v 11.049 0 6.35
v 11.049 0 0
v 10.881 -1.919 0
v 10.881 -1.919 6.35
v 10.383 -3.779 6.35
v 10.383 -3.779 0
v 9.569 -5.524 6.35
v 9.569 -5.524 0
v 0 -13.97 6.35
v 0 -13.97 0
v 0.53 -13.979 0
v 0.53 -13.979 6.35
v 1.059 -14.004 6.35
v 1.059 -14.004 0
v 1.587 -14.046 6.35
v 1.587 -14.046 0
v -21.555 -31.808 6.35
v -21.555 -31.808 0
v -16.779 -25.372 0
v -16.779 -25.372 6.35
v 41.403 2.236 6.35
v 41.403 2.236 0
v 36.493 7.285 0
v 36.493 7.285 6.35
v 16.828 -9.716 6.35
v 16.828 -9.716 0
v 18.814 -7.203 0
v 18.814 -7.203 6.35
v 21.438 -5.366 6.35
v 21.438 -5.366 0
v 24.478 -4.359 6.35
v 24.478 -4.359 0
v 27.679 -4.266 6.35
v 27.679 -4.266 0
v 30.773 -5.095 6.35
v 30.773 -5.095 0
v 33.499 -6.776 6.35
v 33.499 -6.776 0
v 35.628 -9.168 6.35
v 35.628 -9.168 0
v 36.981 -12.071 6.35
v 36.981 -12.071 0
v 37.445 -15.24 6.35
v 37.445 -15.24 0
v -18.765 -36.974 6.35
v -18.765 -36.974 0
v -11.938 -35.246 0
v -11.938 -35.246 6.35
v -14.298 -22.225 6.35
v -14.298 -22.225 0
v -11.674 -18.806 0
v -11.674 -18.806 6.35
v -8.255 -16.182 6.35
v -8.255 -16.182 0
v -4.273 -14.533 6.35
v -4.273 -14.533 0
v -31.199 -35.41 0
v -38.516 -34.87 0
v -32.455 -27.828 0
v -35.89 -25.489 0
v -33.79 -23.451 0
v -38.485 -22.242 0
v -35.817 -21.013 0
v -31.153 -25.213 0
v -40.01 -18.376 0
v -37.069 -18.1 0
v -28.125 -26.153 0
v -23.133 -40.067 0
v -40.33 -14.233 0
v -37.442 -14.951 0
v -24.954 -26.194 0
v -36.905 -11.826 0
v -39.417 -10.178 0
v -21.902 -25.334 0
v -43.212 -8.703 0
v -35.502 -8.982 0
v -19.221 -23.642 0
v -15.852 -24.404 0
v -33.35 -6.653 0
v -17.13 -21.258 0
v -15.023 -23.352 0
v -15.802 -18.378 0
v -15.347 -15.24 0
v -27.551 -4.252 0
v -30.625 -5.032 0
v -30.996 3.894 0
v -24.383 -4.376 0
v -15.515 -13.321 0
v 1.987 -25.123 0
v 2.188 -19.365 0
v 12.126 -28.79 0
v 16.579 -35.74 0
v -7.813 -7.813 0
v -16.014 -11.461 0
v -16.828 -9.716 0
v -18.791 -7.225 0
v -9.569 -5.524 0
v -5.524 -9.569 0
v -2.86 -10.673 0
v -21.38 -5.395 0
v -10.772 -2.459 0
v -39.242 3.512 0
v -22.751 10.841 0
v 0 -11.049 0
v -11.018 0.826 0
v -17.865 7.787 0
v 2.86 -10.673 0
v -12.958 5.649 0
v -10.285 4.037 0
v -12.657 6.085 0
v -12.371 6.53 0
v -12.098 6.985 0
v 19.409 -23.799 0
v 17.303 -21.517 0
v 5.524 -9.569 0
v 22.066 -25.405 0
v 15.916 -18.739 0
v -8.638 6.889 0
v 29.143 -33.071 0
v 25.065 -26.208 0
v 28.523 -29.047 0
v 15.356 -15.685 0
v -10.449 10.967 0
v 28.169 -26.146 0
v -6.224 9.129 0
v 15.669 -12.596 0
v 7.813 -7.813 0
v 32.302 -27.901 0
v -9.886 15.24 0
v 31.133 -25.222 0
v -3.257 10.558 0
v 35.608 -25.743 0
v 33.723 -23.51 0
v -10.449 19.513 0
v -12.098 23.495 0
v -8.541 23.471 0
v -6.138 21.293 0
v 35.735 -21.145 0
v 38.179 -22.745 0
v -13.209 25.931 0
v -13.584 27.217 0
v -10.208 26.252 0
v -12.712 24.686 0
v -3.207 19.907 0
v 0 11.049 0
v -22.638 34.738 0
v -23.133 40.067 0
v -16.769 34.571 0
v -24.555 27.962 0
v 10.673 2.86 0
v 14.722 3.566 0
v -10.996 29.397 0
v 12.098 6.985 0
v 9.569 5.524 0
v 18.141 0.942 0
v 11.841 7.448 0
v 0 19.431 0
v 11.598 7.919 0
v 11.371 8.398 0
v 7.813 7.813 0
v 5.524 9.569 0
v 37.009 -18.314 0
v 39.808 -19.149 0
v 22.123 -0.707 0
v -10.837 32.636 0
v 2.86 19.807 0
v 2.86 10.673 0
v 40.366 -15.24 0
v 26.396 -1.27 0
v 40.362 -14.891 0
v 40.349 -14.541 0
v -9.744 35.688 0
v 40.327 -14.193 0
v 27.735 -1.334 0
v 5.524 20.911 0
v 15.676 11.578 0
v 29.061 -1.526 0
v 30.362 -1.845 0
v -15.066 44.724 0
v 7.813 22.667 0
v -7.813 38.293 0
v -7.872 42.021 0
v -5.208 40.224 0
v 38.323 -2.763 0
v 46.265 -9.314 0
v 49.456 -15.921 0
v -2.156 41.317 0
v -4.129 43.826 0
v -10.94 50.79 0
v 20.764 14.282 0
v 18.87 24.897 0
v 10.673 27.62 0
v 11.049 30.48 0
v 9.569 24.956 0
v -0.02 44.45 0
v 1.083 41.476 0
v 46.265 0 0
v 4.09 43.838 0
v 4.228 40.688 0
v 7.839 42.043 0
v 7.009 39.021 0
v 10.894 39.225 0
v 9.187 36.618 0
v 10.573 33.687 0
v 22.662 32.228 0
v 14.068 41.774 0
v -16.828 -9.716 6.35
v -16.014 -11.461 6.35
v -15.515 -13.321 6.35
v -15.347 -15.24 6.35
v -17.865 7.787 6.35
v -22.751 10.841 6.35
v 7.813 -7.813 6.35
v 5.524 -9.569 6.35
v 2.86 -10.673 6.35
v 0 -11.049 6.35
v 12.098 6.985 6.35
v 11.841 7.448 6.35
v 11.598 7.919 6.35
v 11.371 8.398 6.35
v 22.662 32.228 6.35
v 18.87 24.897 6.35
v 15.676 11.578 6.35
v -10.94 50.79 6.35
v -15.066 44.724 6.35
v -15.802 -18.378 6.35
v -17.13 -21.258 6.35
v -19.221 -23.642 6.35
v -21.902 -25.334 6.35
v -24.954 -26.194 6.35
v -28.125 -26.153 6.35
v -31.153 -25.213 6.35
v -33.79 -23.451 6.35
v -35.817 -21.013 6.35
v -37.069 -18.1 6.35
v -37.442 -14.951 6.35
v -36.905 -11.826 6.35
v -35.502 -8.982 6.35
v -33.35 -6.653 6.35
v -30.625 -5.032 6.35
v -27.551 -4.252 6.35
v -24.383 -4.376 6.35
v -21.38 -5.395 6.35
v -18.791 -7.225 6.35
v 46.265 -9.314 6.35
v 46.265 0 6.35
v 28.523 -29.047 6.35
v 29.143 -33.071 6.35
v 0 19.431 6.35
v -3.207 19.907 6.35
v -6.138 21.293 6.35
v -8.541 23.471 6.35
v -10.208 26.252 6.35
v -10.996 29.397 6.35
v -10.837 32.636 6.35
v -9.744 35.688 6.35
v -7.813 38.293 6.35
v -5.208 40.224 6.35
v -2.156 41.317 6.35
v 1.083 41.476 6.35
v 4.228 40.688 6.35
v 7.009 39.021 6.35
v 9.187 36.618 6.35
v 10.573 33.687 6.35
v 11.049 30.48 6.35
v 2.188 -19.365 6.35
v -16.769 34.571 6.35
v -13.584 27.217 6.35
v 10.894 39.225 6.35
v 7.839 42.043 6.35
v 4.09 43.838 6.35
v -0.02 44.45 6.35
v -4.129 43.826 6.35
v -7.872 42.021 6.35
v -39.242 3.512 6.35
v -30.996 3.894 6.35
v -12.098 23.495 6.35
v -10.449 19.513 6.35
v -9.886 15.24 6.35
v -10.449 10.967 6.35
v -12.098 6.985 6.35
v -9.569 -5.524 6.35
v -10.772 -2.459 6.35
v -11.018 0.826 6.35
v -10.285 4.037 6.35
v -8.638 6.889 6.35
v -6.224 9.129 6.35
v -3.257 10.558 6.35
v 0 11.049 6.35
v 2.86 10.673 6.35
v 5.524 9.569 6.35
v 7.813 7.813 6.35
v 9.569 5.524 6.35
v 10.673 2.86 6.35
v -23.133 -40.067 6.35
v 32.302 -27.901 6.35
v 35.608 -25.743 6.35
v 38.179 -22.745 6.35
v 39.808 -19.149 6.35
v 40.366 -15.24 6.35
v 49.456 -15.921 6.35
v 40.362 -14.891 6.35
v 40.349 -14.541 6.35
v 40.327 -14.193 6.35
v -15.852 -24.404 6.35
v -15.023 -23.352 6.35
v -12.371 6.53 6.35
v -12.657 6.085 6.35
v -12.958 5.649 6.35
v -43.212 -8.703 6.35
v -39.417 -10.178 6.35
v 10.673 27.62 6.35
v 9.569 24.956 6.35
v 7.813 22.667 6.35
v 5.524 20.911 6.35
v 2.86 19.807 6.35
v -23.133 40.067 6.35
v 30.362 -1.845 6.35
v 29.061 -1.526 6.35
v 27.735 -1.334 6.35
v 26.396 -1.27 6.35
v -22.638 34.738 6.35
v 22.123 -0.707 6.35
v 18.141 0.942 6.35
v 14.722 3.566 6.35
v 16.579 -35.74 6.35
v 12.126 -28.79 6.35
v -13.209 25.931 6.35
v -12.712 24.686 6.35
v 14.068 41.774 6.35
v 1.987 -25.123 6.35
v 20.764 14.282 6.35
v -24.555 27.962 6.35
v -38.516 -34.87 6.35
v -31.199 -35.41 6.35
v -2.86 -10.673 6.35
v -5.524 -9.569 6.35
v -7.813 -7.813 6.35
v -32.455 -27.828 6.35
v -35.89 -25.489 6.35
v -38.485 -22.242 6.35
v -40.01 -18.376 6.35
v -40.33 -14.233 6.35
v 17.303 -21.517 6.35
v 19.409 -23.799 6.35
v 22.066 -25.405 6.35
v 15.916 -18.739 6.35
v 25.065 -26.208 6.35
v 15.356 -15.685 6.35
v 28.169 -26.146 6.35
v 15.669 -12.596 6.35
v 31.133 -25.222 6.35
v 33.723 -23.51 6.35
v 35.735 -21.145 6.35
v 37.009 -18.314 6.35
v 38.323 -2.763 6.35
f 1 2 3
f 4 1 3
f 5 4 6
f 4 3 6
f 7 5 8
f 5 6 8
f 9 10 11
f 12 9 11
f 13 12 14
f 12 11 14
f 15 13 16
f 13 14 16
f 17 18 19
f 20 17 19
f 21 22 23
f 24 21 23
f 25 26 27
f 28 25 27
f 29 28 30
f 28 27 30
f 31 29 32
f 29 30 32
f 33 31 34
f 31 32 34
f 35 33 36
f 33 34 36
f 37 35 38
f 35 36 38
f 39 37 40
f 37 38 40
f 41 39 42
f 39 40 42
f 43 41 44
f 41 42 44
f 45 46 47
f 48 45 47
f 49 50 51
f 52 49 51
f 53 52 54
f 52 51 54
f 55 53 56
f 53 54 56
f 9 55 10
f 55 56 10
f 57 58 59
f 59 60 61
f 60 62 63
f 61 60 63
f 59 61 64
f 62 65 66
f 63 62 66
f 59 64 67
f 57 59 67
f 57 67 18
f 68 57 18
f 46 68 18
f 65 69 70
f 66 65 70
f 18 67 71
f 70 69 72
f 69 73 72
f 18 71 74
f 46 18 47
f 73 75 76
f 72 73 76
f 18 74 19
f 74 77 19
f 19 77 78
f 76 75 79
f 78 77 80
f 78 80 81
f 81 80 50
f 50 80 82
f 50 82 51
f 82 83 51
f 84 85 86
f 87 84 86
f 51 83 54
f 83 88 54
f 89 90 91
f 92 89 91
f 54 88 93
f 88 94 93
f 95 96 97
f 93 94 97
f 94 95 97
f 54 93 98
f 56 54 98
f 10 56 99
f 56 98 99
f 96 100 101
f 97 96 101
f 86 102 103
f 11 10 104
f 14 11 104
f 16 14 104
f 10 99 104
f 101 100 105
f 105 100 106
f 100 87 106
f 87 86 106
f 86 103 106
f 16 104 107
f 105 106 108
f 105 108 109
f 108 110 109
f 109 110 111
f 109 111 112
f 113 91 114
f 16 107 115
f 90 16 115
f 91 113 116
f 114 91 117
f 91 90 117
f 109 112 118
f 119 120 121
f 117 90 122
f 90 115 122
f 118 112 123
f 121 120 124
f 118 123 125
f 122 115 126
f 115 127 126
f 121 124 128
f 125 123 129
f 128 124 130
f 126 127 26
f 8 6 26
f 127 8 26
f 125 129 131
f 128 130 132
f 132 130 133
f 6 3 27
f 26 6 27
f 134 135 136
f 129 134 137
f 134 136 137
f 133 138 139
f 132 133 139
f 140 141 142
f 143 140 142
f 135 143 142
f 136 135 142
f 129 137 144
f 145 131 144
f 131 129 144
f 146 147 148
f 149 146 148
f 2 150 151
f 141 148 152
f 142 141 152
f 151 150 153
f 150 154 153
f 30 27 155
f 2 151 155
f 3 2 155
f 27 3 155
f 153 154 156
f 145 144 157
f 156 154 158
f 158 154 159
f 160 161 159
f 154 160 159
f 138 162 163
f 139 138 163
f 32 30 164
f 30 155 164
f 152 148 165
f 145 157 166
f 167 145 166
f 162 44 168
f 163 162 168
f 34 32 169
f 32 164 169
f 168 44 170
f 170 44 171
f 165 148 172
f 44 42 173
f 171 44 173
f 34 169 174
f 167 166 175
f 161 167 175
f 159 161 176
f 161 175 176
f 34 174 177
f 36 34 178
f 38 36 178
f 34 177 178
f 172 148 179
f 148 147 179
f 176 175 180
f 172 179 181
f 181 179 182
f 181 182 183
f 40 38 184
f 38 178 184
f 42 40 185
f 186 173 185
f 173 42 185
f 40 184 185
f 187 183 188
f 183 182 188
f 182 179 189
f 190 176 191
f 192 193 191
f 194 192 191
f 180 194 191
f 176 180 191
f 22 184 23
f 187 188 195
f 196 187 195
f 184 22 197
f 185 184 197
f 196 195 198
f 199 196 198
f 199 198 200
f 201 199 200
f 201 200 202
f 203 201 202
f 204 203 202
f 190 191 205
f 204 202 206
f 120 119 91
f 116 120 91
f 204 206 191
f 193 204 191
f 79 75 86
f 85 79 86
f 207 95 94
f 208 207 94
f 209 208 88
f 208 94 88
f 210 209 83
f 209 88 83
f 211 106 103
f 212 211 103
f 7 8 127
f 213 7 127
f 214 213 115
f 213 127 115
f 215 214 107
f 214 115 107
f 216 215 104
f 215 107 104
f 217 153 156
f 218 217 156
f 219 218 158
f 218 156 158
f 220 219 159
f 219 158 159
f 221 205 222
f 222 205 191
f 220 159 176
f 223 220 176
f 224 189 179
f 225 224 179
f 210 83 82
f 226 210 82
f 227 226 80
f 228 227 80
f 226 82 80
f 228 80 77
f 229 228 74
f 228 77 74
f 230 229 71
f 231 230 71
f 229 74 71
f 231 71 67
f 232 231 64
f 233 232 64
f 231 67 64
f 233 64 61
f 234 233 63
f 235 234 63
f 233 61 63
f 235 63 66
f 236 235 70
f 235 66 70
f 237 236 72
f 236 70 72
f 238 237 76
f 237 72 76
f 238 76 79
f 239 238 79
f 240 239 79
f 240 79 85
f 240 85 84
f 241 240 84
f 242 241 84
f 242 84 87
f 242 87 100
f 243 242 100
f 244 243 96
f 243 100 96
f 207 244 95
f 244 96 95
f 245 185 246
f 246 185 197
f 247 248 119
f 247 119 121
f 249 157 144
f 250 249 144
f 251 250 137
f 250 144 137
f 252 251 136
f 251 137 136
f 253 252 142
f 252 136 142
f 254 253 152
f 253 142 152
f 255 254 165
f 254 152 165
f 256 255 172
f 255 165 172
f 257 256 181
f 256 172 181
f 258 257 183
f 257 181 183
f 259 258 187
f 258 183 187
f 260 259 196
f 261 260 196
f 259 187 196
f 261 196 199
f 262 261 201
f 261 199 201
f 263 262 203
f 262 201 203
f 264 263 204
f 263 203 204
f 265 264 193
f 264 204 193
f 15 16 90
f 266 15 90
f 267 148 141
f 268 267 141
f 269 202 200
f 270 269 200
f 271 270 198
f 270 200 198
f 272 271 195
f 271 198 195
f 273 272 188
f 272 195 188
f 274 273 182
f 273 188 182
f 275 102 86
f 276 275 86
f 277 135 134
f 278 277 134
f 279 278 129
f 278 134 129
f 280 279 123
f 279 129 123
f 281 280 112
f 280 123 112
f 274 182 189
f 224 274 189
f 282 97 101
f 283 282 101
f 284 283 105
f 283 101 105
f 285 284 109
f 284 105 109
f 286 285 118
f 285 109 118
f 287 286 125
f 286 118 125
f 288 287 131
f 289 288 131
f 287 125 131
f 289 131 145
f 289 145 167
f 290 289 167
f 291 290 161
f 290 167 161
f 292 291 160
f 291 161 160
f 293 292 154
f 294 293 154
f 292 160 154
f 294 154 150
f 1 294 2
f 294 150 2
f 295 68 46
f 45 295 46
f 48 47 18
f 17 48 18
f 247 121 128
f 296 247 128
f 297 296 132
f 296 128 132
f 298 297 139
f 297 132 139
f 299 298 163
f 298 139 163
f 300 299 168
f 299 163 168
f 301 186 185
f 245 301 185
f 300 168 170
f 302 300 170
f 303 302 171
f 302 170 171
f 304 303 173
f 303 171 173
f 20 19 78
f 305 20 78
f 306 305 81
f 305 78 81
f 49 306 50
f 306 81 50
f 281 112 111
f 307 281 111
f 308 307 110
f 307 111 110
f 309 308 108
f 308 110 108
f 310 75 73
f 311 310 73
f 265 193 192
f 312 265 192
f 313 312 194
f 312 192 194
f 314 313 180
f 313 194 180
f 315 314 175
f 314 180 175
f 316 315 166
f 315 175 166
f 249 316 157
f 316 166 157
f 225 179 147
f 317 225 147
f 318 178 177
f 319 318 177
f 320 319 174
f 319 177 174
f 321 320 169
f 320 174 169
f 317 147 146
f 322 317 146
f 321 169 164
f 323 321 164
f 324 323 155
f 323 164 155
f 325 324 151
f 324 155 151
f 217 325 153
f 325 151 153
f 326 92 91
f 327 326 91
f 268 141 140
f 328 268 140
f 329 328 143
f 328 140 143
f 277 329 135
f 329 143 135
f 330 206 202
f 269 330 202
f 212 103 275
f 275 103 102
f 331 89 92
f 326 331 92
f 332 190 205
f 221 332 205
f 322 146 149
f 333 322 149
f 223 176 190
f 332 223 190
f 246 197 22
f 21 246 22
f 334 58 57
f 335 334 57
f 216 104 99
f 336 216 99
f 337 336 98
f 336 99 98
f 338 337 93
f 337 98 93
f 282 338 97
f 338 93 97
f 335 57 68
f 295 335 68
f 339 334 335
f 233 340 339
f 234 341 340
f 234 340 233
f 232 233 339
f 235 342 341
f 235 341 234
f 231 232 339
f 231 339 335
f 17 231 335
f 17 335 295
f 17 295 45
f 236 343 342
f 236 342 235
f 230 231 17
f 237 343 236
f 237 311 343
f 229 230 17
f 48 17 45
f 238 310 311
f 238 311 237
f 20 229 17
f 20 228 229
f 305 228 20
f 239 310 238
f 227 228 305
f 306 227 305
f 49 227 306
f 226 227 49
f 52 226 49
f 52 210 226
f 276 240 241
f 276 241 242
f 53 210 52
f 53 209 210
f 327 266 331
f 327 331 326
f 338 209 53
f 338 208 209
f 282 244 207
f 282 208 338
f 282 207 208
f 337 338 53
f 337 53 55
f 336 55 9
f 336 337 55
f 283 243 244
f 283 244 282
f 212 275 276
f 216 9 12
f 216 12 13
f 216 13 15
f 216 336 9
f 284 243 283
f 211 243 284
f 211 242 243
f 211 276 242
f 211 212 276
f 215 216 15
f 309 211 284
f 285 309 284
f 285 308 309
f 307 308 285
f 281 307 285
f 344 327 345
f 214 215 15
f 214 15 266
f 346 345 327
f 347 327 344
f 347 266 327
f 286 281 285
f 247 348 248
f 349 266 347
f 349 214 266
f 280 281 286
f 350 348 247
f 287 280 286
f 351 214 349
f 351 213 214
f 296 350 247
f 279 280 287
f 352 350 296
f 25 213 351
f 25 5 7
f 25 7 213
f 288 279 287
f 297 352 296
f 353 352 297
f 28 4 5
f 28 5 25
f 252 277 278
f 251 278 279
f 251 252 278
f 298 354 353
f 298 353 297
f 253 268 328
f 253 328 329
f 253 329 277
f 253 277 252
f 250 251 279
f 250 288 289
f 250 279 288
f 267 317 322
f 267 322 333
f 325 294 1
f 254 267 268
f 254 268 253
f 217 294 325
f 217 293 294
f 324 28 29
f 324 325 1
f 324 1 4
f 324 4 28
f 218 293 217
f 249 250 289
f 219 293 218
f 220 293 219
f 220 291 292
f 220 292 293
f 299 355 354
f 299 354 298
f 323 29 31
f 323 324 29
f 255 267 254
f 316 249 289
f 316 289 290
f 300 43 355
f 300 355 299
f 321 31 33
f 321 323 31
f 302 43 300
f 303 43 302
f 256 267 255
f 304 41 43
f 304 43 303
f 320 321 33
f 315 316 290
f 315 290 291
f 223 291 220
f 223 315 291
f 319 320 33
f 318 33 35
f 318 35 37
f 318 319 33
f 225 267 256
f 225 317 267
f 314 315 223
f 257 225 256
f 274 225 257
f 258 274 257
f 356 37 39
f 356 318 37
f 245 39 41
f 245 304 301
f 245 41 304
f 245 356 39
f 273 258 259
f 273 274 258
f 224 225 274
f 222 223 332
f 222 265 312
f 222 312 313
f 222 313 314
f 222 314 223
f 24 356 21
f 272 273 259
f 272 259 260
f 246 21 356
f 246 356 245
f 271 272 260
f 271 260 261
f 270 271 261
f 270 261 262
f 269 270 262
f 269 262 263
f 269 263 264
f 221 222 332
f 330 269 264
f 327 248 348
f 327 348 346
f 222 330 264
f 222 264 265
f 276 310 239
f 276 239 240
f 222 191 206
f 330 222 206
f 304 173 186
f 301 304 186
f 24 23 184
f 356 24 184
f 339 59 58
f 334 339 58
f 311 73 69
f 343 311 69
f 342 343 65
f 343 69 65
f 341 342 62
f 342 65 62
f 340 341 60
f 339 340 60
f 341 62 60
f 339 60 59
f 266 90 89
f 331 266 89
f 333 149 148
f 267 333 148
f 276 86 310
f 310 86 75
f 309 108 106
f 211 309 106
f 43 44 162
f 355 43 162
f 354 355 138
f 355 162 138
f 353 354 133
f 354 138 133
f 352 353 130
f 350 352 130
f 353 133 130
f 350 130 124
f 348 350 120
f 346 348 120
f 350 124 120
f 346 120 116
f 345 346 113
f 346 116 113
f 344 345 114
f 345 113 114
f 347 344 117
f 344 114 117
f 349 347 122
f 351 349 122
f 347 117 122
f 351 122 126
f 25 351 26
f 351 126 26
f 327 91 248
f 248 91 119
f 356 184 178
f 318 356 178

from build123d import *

# Parameters (mm, degrees)
F1_DEPTH = 6.35


with BuildPart() as f1:
    # F0 (on Top) → F1 (new body)
    with BuildSketch(Plane.XY):
        with BuildLine():
            ThreePointArc((12.0983748909, -6.985), (13.4939837933, -3.6157020601), (13.97, 0))
            ThreePointArc((13.97, 0), (13.4939838226, 3.6157019506), (12.0983750042, 6.9849998037))
            ThreePointArc((12.0983750042, 6.9849998037), (11.6864099278, 7.6543270769), (11.2374555691, 8.2994272292))
            ThreePointArc((11.2374555691, 8.2994272292), (6.2935642369, 12.4720467124), (0, 13.97))
            Line((0, 13.97), (0, 11.049))
            ThreePointArc((0, 11.049), (7.8128228253, 7.8128228253), (11.049, 0))
            ThreePointArc((11.049, 0), (10.6725144547, -2.8596916293), (9.5687146864, -5.5245))
            Line((9.5687146864, -5.5245), (12.0983748909, -6.985))
        make_face()
        with BuildLine():
            ThreePointArc((12.0983750042, 6.9849998037), (13.4939838226, 3.6157019506), (13.97, 0))
            ThreePointArc((13.97, 0), (13.4939837933, -3.6157020601), (12.0983748909, -6.985))
            Line((12.0983748909, -6.985), (14.2980794165, -8.255))
            ThreePointArc((14.2980794165, -8.255), (19.4114543073, -3.1416251091), (26.3964543073, -1.27))
            ThreePointArc((26.3964543073, -1.27), (18.1414544055, 0.9419205269), (12.0983750042, 6.9849998037))
        make_face()
        with BuildLine():
            ThreePointArc((11.2374555691, 8.2994272292), (11.6864099278, 7.6543270769), (12.0983750042, 6.9849998037))
            ThreePointArc((12.0983750042, 6.9849998037), (11.7176305412, 7.6827364184), (11.3709095484, 8.3979897181))
            Line((11.3709095484, 8.3979897181), (11.2374555691, 8.2994272292))
        make_face()
        with BuildLine():
            Line((14.2980794165, -8.255), (12.0983748909, -6.985))
            ThreePointArc((12.0983748909, -6.985), (7.6543271717, -11.6864098657), (1.5687870328, -13.8816356113))
            Line((1.5687870328, -13.8816356113), (1.5874176624, -14.0464913921))
            ThreePointArc((1.5874176624, -14.0464913921), (8.9336025837, -16.5958059335), (14.2980794165, -22.225))
            ThreePointArc((14.2980794165, -22.225), (12.4264543073, -15.24), (14.2980794165, -8.255))
        make_face()
        with BuildLine():
            ThreePointArc((1.5687870328, -13.8816356113), (7.6543271717, -11.6864098657), (12.0983748909, -6.985))
            Line((12.0983748909, -6.985), (9.5687146864, -5.5245))
            ThreePointArc((9.5687146864, -5.5245), (5.5245, -9.5687146864), (0, -11.049))
            Line((0, -11.049), (0, -13.97))
            ThreePointArc((8e-10, -13.97), (0.7856368471, -13.9478914085), (1.5687870328, -13.8816356113))
        make_face()
        with BuildLine():
            ThreePointArc((0, 13.97), (6.2935642369, 12.4720467124), (11.2374555691, 8.2994272292))
            Line((11.2374555691, 8.2994272292), (11.3709095484, 8.3979897181))
            ThreePointArc((11.3709095484, 8.3979897181), (9.9055882428, 16.0346297515), (12.0983748909, 23.495))
            ThreePointArc((12.0983748909, 23.495), (6.985, 18.3816251091), (0, 16.51))
            Line((0, 16.51), (0, 13.97))
        make_face()
        with BuildLine():
            ThreePointArc((12.0983748909, 23.495), (9.9055882428, 16.0346297515), (11.3709095484, 8.3979897181))
            Line((11.3709095484, 8.3979897181), (15.6763562571, 11.5777790778))
            Line((15.6763562571, 11.5777790778), (16.7196467519, 28.9592776589))
            Line((16.7196467519, 28.9592776589), (14.0684077992, 41.7739531481))
            Line((14.0684077992, 41.7739531481), (10.8939042526, 39.22549885))
            ThreePointArc((10.8939042526, 39.22549885), (13.1785572505, 35.1153563828), (13.97, 30.48))
            ThreePointArc((13.97, 30.48), (13.4939837933, 26.8642979399), (12.0983748909, 23.495))
        make_face()
        with BuildLine():
            ThreePointArc((30.3624386184, -1.8447818814), (28.4001637278, -1.4144421972), (26.3964543073, -1.27))
            ThreePointArc((26.3964543073, -1.27), (19.4114543073, -3.1416251091), (14.2980794165, -8.255))
            ThreePointArc((14.2980794165, -8.255), (12.4264543073, -15.24), (14.2980794165, -22.225))
            ThreePointArc((14.2980794165, -22.225), (20.3554990408, -27.8363391296), (28.5233263539, -29.0471472541))
            ThreePointArc((28.5233263539, -29.0471472541), (37.0000693157, -24.3352871728), (40.3664543073, -15.24))
            ThreePointArc((40.3664543073, -15.24), (40.3566217968, -14.7159545186), (40.327138106, -14.1926467154))
            ThreePointArc((40.327138106, -14.1926467154), (37.2679824358, -6.4667009538), (30.3624386184, -1.8447818814))
        make_face()
        with BuildLine():
            ThreePointArc((37.4454543073, -15.24), (23.536762678, -25.9125144547), (16.8277396209, -9.7155))
            ThreePointArc((16.8277396209, -9.7155), (29.2561459367, -4.5674855453), (37.4454543073, -15.24))
        make_face(mode=Mode.SUBTRACT)
        with BuildLine():
            Line((1.5874176624, -14.0464913921), (1.5687870328, -13.8816356113))
            ThreePointArc((1.5687870328, -13.8816356113), (0.7856368471, -13.9478914085), (8e-10, -13.97))
            ThreePointArc((8e-10, -13.97), (0.7946297519, -13.9891339355), (1.5874176624, -14.0464913921))
        make_face()
        with BuildLine():
            Line((0, 11.049), (0, 13.97))
            ThreePointArc((0, 13.97), (-6.9849999862, 12.0983748988), (-12.0983748749, 6.9850000276))
            ThreePointArc((-12.0983748749, 6.9850000276), (-12.4720467052, 6.2935642511), (-12.8062426019, 5.5822083821))
            ThreePointArc((-12.8062426019, 5.5822083821), (-13.9478914086, -0.7856368467), (-12.0983748909, -6.985))
            Line((-12.0983748909, -6.985), (-9.5687146864, -5.5245))
            ThreePointArc((-9.5687146864, -5.5245), (-9.5687146864, 5.5245), (0, 11.049))
        make_face()
        with BuildLine():
            ThreePointArc((-12.0983748749, 6.9850000276), (-6.9849999862, 12.0983748988), (0, 13.97))
            Line((0, 13.97), (0, 16.51))
            ThreePointArc((0, 16.51), (-6.985, 18.3816251091), (-12.0983748909, 23.495))
            ThreePointArc((-12.0983748909, 23.495), (-9.8864543073, 15.2400000159), (-12.0983748749, 6.9850000276))
        make_face()
        with BuildLine():
            ThreePointArc((0, 16.51), (6.985, 18.3816251091), (12.0983748909, 23.495))
            ThreePointArc((12.0983748909, 23.495), (13.4939837933, 26.8642979399), (13.97, 30.48))
            ThreePointArc((13.97, 30.48), (13.1785572505, 35.1153563828), (10.8939042526, 39.22549885))
            ThreePointArc((10.8939042526, 39.22549885), (2.0580632257, 44.2975712685), (-7.8723764505, 42.0206494194))
            ThreePointArc((-7.8723764505, 42.0206494194), (-13.0336639132, 35.5083700141), (-13.5835913355, 27.2170341051))
            ThreePointArc((-13.5835913355, 27.2170341051), (-12.9751389889, 25.3024843585), (-12.0983748909, 23.495))
            ThreePointArc((-12.0983748909, 23.495), (-6.985, 18.3816251091), (0, 16.51))
        make_face()
        with BuildLine():
            ThreePointArc((11.049, 30.48), (7.8128228253, 22.6671771747), (0, 19.431))
            ThreePointArc((0, 19.431), (-7.8128228253, 38.2928228253), (11.049, 30.48))
        make_face(mode=Mode.SUBTRACT)
        Polygon((16.7196467519, 28.9592776589), (15.6763562571, 11.5777790778), (20.7640930884, 14.2823638317), (22.6621578626, 32.2282300832), (18.870091234, 24.8967235421), (14.0684077992, 41.7739531481), align=None)
        with BuildLine():
            Line((38.3234498435, -2.7629918247), (30.3624386184, -1.8447818814))
            ThreePointArc((30.3624386184, -1.8447818814), (37.2679824358, -6.4667009538), (40.327138106, -14.1926467154))
            Line((40.327138106, -14.1926467154), (49.4559597003, -15.9205574542))
            Line((49.4559597003, -15.9205574542), (46.265322715, -9.3141412362))
            Line((46.265322715, -9.3141412362), (46.265322715, 0))
            Line((46.265322715, 0), (41.4031764655, 2.2357433816))
            Line((41.4031764655, 2.2357433816), (36.4931114018, 7.2845408358))
            Line((36.4931114018, 7.2845408358), (38.3234498435, -2.7629918247))
        make_face()
        with BuildLine():
            ThreePointArc((-14.2980794165, -22.225), (-8.2549999996, -16.1819205833), (8e-10, -13.97))
            ThreePointArc((8e-10, -13.97), (-6.9849999996, -12.0983748911), (-12.0983748909, -6.985))
            Line((-12.0983748909, -6.985), (-14.2980794165, -8.255))
            ThreePointArc((-14.2980794165, -8.255), (-12.9024705141, -11.6242979399), (-12.4264543073, -15.24))
            ThreePointArc((-12.4264543073, -15.24), (-12.9024705141, -18.8557020601), (-14.2980794165, -22.225))
        make_face()
        with BuildLine():
            ThreePointArc((-12.0983748909, -6.985), (-6.9849999996, -12.0983748911), (8e-10, -13.97))
            Line((0, -13.97), (0, -11.049))
            ThreePointArc((0, -11.049), (-5.5245, -9.5687146864), (-9.5687146864, -5.5245))
            Line((-9.5687146864, -5.5245), (-12.0983748909, -6.985))
        make_face()
        with BuildLine():
            ThreePointArc((14.2980794165, -22.225), (8.9336025837, -16.5958059335), (1.5874176624, -14.0464913921))
            Line((1.5874176624, -14.0464913921), (2.1884726722, -19.3650122963))
            Line((2.1884726722, -19.3650122963), (16.7196467519, -28.9592776589))
            Line((16.7196467519, -28.9592776589), (29.1431007431, -33.0705751189))
            Line((29.1431007431, -33.0705751189), (28.5233263539, -29.0471472541))
            ThreePointArc((28.5233263539, -29.0471472541), (20.3554990408, -27.8363391296), (14.2980794165, -22.225))
        make_face()
        with BuildLine():
            ThreePointArc((-12.8062426019, 5.5822083821), (-12.4720467052, 6.2935642511), (-12.0983748749, 6.9850000276))
            ThreePointArc((-12.0983748749, 6.9850000276), (-12.5122602322, 6.3063974297), (-12.9583272108, 5.648501674))
            Line((-12.9583272108, 5.648501674), (-12.8062426019, 5.5822083821))
        make_face()
        with BuildLine():
            Line((-14.2980794165, -8.255), (-12.0983748909, -6.985))
            ThreePointArc((-12.0983748909, -6.985), (-13.9478914086, -0.7856368467), (-12.8062426019, 5.5822083821))
            Line((-12.8062426019, 5.5822083821), (-12.9583272108, 5.648501674))
            ThreePointArc((-12.9583272108, 5.648501674), (-18.8391908265, 0.561176182), (-26.3964543073, -1.27))
            ThreePointArc((-26.3964543073, -1.27), (-19.4114543073, -3.1416251091), (-14.2980794165, -8.255))
        make_face()
        with BuildLine():
            ThreePointArc((-16.778847283, -25.3722522237), (-15.4250247389, -23.8880421613), (-14.2980794165, -22.225))
            ThreePointArc((-14.2980794165, -22.225), (-12.9024705141, -18.8557020601), (-12.4264543073, -15.24))
            ThreePointArc((-12.4264543073, -15.24), (-12.9024705141, -11.6242979399), (-14.2980794165, -8.255))
            ThreePointArc((-14.2980794165, -8.255), (-19.4114543073, -3.1416251091), (-26.3964543073, -1.27))
            ThreePointArc((-26.3964543073, -1.27), (-34.2847263549, -3.7102097112), (-39.4172306065, -10.1783515958))
            ThreePointArc((-39.4172306065, -10.1783515958), (-39.3918536573, -20.3664505981), (-32.4547616555, -27.828002704))
            ThreePointArc((-32.4547616555, -27.828002704), (-24.2343185226, -29.0416690602), (-16.778847283, -25.3722522237))
        make_face()
        with BuildLine():
            ThreePointArc((-15.3474543073, -15.24), (-37.068968762, -18.0996916293), (-16.8277396209, -9.7155))
            ThreePointArc((-16.8277396209, -9.7155), (-15.7239398527, -12.3803083707), (-15.3474543073, -15.24))
        make_face(mode=Mode.SUBTRACT)
        Polygon((16.7196467519, -28.9592776589), (2.1884726722, -19.3650122963), (1.9868433601, -25.123414017), (16.5793870397, -35.7401194552), (12.1261494415, -28.7903401514), (29.1431007431, -33.0705751189), align=None)
        with BuildLine():
            ThreePointArc((-26.3964543073, -1.27), (-18.8391908265, 0.561176182), (-12.9583272108, 5.648501674))
            Line((-12.9583272108, 5.648501674), (-17.8648289293, 7.7872332186))
            Line((-17.8648289293, 7.7872332186), (-33.4392935038, 0))
            Line((-33.4392935038, 0), (-43.2115085423, -8.7033780292))
            Line((-43.2115085423, -8.7033780292), (-39.4172306065, -10.1783515958))
            ThreePointArc((-39.4172306065, -10.1783515958), (-34.2847263549, -3.7102097112), (-26.3964543073, -1.27))
        make_face()
        with BuildLine():
            Line((-21.5545460324, -31.8075852128), (-16.778847283, -25.3722522237))
            ThreePointArc((-16.778847283, -25.3722522237), (-24.2343185226, -29.0416690602), (-32.4547616555, -27.828002704))
            Line((-32.4547616555, -27.828002704), (-38.5155870479, -34.8698387419))
            Line((-38.5155870479, -34.8698387419), (-31.1989442825, -35.4098741674))
            Line((-31.1989442825, -35.4098741674), (-23.1326613575, -40.0669447855))
            Line((-23.1326613575, -40.0669447855), (-18.7653776679, -36.9740743073))
            Line((-18.7653776679, -36.9740743073), (-11.9379582822, -35.246231955))
            Line((-11.9379582822, -35.246231955), (-21.5545460324, -31.8075852128))
        make_face()
        Polygon((-33.4392935038, 0), (-17.8648289293, 7.7872332186), (-22.7509364486, 10.8410501853), (-39.2415449023, 3.511889372), (-30.9962406754, 3.8936166093), (-43.2115085423, -8.7033780292), align=None)
        with BuildLine():
            Line((-16.7689038112, 34.5705770375), (-13.5835913355, 27.2170341051))
            ThreePointArc((-13.5835913355, 27.2170341051), (-13.0336639132, 35.5083700141), (-7.8723764505, 42.0206494194))
            Line((-7.8723764505, 42.0206494194), (-10.9403726524, 50.7903961961))
            Line((-10.9403726524, 50.7903961961), (-15.0663784325, 44.7240154036))
            Line((-15.0663784325, 44.7240154036), (-23.1326613575, 40.0669447855))
            Line((-23.1326613575, 40.0669447855), (-22.6377987976, 34.7383309257))
            Line((-22.6377987976, 34.7383309257), (-24.5551531196, 27.9616911192))
            Line((-24.5551531196, 27.9616911192), (-16.7689038112, 34.5705770375))
        make_face()
    extrude(amount=F1_DEPTH)


solid = f1.part
